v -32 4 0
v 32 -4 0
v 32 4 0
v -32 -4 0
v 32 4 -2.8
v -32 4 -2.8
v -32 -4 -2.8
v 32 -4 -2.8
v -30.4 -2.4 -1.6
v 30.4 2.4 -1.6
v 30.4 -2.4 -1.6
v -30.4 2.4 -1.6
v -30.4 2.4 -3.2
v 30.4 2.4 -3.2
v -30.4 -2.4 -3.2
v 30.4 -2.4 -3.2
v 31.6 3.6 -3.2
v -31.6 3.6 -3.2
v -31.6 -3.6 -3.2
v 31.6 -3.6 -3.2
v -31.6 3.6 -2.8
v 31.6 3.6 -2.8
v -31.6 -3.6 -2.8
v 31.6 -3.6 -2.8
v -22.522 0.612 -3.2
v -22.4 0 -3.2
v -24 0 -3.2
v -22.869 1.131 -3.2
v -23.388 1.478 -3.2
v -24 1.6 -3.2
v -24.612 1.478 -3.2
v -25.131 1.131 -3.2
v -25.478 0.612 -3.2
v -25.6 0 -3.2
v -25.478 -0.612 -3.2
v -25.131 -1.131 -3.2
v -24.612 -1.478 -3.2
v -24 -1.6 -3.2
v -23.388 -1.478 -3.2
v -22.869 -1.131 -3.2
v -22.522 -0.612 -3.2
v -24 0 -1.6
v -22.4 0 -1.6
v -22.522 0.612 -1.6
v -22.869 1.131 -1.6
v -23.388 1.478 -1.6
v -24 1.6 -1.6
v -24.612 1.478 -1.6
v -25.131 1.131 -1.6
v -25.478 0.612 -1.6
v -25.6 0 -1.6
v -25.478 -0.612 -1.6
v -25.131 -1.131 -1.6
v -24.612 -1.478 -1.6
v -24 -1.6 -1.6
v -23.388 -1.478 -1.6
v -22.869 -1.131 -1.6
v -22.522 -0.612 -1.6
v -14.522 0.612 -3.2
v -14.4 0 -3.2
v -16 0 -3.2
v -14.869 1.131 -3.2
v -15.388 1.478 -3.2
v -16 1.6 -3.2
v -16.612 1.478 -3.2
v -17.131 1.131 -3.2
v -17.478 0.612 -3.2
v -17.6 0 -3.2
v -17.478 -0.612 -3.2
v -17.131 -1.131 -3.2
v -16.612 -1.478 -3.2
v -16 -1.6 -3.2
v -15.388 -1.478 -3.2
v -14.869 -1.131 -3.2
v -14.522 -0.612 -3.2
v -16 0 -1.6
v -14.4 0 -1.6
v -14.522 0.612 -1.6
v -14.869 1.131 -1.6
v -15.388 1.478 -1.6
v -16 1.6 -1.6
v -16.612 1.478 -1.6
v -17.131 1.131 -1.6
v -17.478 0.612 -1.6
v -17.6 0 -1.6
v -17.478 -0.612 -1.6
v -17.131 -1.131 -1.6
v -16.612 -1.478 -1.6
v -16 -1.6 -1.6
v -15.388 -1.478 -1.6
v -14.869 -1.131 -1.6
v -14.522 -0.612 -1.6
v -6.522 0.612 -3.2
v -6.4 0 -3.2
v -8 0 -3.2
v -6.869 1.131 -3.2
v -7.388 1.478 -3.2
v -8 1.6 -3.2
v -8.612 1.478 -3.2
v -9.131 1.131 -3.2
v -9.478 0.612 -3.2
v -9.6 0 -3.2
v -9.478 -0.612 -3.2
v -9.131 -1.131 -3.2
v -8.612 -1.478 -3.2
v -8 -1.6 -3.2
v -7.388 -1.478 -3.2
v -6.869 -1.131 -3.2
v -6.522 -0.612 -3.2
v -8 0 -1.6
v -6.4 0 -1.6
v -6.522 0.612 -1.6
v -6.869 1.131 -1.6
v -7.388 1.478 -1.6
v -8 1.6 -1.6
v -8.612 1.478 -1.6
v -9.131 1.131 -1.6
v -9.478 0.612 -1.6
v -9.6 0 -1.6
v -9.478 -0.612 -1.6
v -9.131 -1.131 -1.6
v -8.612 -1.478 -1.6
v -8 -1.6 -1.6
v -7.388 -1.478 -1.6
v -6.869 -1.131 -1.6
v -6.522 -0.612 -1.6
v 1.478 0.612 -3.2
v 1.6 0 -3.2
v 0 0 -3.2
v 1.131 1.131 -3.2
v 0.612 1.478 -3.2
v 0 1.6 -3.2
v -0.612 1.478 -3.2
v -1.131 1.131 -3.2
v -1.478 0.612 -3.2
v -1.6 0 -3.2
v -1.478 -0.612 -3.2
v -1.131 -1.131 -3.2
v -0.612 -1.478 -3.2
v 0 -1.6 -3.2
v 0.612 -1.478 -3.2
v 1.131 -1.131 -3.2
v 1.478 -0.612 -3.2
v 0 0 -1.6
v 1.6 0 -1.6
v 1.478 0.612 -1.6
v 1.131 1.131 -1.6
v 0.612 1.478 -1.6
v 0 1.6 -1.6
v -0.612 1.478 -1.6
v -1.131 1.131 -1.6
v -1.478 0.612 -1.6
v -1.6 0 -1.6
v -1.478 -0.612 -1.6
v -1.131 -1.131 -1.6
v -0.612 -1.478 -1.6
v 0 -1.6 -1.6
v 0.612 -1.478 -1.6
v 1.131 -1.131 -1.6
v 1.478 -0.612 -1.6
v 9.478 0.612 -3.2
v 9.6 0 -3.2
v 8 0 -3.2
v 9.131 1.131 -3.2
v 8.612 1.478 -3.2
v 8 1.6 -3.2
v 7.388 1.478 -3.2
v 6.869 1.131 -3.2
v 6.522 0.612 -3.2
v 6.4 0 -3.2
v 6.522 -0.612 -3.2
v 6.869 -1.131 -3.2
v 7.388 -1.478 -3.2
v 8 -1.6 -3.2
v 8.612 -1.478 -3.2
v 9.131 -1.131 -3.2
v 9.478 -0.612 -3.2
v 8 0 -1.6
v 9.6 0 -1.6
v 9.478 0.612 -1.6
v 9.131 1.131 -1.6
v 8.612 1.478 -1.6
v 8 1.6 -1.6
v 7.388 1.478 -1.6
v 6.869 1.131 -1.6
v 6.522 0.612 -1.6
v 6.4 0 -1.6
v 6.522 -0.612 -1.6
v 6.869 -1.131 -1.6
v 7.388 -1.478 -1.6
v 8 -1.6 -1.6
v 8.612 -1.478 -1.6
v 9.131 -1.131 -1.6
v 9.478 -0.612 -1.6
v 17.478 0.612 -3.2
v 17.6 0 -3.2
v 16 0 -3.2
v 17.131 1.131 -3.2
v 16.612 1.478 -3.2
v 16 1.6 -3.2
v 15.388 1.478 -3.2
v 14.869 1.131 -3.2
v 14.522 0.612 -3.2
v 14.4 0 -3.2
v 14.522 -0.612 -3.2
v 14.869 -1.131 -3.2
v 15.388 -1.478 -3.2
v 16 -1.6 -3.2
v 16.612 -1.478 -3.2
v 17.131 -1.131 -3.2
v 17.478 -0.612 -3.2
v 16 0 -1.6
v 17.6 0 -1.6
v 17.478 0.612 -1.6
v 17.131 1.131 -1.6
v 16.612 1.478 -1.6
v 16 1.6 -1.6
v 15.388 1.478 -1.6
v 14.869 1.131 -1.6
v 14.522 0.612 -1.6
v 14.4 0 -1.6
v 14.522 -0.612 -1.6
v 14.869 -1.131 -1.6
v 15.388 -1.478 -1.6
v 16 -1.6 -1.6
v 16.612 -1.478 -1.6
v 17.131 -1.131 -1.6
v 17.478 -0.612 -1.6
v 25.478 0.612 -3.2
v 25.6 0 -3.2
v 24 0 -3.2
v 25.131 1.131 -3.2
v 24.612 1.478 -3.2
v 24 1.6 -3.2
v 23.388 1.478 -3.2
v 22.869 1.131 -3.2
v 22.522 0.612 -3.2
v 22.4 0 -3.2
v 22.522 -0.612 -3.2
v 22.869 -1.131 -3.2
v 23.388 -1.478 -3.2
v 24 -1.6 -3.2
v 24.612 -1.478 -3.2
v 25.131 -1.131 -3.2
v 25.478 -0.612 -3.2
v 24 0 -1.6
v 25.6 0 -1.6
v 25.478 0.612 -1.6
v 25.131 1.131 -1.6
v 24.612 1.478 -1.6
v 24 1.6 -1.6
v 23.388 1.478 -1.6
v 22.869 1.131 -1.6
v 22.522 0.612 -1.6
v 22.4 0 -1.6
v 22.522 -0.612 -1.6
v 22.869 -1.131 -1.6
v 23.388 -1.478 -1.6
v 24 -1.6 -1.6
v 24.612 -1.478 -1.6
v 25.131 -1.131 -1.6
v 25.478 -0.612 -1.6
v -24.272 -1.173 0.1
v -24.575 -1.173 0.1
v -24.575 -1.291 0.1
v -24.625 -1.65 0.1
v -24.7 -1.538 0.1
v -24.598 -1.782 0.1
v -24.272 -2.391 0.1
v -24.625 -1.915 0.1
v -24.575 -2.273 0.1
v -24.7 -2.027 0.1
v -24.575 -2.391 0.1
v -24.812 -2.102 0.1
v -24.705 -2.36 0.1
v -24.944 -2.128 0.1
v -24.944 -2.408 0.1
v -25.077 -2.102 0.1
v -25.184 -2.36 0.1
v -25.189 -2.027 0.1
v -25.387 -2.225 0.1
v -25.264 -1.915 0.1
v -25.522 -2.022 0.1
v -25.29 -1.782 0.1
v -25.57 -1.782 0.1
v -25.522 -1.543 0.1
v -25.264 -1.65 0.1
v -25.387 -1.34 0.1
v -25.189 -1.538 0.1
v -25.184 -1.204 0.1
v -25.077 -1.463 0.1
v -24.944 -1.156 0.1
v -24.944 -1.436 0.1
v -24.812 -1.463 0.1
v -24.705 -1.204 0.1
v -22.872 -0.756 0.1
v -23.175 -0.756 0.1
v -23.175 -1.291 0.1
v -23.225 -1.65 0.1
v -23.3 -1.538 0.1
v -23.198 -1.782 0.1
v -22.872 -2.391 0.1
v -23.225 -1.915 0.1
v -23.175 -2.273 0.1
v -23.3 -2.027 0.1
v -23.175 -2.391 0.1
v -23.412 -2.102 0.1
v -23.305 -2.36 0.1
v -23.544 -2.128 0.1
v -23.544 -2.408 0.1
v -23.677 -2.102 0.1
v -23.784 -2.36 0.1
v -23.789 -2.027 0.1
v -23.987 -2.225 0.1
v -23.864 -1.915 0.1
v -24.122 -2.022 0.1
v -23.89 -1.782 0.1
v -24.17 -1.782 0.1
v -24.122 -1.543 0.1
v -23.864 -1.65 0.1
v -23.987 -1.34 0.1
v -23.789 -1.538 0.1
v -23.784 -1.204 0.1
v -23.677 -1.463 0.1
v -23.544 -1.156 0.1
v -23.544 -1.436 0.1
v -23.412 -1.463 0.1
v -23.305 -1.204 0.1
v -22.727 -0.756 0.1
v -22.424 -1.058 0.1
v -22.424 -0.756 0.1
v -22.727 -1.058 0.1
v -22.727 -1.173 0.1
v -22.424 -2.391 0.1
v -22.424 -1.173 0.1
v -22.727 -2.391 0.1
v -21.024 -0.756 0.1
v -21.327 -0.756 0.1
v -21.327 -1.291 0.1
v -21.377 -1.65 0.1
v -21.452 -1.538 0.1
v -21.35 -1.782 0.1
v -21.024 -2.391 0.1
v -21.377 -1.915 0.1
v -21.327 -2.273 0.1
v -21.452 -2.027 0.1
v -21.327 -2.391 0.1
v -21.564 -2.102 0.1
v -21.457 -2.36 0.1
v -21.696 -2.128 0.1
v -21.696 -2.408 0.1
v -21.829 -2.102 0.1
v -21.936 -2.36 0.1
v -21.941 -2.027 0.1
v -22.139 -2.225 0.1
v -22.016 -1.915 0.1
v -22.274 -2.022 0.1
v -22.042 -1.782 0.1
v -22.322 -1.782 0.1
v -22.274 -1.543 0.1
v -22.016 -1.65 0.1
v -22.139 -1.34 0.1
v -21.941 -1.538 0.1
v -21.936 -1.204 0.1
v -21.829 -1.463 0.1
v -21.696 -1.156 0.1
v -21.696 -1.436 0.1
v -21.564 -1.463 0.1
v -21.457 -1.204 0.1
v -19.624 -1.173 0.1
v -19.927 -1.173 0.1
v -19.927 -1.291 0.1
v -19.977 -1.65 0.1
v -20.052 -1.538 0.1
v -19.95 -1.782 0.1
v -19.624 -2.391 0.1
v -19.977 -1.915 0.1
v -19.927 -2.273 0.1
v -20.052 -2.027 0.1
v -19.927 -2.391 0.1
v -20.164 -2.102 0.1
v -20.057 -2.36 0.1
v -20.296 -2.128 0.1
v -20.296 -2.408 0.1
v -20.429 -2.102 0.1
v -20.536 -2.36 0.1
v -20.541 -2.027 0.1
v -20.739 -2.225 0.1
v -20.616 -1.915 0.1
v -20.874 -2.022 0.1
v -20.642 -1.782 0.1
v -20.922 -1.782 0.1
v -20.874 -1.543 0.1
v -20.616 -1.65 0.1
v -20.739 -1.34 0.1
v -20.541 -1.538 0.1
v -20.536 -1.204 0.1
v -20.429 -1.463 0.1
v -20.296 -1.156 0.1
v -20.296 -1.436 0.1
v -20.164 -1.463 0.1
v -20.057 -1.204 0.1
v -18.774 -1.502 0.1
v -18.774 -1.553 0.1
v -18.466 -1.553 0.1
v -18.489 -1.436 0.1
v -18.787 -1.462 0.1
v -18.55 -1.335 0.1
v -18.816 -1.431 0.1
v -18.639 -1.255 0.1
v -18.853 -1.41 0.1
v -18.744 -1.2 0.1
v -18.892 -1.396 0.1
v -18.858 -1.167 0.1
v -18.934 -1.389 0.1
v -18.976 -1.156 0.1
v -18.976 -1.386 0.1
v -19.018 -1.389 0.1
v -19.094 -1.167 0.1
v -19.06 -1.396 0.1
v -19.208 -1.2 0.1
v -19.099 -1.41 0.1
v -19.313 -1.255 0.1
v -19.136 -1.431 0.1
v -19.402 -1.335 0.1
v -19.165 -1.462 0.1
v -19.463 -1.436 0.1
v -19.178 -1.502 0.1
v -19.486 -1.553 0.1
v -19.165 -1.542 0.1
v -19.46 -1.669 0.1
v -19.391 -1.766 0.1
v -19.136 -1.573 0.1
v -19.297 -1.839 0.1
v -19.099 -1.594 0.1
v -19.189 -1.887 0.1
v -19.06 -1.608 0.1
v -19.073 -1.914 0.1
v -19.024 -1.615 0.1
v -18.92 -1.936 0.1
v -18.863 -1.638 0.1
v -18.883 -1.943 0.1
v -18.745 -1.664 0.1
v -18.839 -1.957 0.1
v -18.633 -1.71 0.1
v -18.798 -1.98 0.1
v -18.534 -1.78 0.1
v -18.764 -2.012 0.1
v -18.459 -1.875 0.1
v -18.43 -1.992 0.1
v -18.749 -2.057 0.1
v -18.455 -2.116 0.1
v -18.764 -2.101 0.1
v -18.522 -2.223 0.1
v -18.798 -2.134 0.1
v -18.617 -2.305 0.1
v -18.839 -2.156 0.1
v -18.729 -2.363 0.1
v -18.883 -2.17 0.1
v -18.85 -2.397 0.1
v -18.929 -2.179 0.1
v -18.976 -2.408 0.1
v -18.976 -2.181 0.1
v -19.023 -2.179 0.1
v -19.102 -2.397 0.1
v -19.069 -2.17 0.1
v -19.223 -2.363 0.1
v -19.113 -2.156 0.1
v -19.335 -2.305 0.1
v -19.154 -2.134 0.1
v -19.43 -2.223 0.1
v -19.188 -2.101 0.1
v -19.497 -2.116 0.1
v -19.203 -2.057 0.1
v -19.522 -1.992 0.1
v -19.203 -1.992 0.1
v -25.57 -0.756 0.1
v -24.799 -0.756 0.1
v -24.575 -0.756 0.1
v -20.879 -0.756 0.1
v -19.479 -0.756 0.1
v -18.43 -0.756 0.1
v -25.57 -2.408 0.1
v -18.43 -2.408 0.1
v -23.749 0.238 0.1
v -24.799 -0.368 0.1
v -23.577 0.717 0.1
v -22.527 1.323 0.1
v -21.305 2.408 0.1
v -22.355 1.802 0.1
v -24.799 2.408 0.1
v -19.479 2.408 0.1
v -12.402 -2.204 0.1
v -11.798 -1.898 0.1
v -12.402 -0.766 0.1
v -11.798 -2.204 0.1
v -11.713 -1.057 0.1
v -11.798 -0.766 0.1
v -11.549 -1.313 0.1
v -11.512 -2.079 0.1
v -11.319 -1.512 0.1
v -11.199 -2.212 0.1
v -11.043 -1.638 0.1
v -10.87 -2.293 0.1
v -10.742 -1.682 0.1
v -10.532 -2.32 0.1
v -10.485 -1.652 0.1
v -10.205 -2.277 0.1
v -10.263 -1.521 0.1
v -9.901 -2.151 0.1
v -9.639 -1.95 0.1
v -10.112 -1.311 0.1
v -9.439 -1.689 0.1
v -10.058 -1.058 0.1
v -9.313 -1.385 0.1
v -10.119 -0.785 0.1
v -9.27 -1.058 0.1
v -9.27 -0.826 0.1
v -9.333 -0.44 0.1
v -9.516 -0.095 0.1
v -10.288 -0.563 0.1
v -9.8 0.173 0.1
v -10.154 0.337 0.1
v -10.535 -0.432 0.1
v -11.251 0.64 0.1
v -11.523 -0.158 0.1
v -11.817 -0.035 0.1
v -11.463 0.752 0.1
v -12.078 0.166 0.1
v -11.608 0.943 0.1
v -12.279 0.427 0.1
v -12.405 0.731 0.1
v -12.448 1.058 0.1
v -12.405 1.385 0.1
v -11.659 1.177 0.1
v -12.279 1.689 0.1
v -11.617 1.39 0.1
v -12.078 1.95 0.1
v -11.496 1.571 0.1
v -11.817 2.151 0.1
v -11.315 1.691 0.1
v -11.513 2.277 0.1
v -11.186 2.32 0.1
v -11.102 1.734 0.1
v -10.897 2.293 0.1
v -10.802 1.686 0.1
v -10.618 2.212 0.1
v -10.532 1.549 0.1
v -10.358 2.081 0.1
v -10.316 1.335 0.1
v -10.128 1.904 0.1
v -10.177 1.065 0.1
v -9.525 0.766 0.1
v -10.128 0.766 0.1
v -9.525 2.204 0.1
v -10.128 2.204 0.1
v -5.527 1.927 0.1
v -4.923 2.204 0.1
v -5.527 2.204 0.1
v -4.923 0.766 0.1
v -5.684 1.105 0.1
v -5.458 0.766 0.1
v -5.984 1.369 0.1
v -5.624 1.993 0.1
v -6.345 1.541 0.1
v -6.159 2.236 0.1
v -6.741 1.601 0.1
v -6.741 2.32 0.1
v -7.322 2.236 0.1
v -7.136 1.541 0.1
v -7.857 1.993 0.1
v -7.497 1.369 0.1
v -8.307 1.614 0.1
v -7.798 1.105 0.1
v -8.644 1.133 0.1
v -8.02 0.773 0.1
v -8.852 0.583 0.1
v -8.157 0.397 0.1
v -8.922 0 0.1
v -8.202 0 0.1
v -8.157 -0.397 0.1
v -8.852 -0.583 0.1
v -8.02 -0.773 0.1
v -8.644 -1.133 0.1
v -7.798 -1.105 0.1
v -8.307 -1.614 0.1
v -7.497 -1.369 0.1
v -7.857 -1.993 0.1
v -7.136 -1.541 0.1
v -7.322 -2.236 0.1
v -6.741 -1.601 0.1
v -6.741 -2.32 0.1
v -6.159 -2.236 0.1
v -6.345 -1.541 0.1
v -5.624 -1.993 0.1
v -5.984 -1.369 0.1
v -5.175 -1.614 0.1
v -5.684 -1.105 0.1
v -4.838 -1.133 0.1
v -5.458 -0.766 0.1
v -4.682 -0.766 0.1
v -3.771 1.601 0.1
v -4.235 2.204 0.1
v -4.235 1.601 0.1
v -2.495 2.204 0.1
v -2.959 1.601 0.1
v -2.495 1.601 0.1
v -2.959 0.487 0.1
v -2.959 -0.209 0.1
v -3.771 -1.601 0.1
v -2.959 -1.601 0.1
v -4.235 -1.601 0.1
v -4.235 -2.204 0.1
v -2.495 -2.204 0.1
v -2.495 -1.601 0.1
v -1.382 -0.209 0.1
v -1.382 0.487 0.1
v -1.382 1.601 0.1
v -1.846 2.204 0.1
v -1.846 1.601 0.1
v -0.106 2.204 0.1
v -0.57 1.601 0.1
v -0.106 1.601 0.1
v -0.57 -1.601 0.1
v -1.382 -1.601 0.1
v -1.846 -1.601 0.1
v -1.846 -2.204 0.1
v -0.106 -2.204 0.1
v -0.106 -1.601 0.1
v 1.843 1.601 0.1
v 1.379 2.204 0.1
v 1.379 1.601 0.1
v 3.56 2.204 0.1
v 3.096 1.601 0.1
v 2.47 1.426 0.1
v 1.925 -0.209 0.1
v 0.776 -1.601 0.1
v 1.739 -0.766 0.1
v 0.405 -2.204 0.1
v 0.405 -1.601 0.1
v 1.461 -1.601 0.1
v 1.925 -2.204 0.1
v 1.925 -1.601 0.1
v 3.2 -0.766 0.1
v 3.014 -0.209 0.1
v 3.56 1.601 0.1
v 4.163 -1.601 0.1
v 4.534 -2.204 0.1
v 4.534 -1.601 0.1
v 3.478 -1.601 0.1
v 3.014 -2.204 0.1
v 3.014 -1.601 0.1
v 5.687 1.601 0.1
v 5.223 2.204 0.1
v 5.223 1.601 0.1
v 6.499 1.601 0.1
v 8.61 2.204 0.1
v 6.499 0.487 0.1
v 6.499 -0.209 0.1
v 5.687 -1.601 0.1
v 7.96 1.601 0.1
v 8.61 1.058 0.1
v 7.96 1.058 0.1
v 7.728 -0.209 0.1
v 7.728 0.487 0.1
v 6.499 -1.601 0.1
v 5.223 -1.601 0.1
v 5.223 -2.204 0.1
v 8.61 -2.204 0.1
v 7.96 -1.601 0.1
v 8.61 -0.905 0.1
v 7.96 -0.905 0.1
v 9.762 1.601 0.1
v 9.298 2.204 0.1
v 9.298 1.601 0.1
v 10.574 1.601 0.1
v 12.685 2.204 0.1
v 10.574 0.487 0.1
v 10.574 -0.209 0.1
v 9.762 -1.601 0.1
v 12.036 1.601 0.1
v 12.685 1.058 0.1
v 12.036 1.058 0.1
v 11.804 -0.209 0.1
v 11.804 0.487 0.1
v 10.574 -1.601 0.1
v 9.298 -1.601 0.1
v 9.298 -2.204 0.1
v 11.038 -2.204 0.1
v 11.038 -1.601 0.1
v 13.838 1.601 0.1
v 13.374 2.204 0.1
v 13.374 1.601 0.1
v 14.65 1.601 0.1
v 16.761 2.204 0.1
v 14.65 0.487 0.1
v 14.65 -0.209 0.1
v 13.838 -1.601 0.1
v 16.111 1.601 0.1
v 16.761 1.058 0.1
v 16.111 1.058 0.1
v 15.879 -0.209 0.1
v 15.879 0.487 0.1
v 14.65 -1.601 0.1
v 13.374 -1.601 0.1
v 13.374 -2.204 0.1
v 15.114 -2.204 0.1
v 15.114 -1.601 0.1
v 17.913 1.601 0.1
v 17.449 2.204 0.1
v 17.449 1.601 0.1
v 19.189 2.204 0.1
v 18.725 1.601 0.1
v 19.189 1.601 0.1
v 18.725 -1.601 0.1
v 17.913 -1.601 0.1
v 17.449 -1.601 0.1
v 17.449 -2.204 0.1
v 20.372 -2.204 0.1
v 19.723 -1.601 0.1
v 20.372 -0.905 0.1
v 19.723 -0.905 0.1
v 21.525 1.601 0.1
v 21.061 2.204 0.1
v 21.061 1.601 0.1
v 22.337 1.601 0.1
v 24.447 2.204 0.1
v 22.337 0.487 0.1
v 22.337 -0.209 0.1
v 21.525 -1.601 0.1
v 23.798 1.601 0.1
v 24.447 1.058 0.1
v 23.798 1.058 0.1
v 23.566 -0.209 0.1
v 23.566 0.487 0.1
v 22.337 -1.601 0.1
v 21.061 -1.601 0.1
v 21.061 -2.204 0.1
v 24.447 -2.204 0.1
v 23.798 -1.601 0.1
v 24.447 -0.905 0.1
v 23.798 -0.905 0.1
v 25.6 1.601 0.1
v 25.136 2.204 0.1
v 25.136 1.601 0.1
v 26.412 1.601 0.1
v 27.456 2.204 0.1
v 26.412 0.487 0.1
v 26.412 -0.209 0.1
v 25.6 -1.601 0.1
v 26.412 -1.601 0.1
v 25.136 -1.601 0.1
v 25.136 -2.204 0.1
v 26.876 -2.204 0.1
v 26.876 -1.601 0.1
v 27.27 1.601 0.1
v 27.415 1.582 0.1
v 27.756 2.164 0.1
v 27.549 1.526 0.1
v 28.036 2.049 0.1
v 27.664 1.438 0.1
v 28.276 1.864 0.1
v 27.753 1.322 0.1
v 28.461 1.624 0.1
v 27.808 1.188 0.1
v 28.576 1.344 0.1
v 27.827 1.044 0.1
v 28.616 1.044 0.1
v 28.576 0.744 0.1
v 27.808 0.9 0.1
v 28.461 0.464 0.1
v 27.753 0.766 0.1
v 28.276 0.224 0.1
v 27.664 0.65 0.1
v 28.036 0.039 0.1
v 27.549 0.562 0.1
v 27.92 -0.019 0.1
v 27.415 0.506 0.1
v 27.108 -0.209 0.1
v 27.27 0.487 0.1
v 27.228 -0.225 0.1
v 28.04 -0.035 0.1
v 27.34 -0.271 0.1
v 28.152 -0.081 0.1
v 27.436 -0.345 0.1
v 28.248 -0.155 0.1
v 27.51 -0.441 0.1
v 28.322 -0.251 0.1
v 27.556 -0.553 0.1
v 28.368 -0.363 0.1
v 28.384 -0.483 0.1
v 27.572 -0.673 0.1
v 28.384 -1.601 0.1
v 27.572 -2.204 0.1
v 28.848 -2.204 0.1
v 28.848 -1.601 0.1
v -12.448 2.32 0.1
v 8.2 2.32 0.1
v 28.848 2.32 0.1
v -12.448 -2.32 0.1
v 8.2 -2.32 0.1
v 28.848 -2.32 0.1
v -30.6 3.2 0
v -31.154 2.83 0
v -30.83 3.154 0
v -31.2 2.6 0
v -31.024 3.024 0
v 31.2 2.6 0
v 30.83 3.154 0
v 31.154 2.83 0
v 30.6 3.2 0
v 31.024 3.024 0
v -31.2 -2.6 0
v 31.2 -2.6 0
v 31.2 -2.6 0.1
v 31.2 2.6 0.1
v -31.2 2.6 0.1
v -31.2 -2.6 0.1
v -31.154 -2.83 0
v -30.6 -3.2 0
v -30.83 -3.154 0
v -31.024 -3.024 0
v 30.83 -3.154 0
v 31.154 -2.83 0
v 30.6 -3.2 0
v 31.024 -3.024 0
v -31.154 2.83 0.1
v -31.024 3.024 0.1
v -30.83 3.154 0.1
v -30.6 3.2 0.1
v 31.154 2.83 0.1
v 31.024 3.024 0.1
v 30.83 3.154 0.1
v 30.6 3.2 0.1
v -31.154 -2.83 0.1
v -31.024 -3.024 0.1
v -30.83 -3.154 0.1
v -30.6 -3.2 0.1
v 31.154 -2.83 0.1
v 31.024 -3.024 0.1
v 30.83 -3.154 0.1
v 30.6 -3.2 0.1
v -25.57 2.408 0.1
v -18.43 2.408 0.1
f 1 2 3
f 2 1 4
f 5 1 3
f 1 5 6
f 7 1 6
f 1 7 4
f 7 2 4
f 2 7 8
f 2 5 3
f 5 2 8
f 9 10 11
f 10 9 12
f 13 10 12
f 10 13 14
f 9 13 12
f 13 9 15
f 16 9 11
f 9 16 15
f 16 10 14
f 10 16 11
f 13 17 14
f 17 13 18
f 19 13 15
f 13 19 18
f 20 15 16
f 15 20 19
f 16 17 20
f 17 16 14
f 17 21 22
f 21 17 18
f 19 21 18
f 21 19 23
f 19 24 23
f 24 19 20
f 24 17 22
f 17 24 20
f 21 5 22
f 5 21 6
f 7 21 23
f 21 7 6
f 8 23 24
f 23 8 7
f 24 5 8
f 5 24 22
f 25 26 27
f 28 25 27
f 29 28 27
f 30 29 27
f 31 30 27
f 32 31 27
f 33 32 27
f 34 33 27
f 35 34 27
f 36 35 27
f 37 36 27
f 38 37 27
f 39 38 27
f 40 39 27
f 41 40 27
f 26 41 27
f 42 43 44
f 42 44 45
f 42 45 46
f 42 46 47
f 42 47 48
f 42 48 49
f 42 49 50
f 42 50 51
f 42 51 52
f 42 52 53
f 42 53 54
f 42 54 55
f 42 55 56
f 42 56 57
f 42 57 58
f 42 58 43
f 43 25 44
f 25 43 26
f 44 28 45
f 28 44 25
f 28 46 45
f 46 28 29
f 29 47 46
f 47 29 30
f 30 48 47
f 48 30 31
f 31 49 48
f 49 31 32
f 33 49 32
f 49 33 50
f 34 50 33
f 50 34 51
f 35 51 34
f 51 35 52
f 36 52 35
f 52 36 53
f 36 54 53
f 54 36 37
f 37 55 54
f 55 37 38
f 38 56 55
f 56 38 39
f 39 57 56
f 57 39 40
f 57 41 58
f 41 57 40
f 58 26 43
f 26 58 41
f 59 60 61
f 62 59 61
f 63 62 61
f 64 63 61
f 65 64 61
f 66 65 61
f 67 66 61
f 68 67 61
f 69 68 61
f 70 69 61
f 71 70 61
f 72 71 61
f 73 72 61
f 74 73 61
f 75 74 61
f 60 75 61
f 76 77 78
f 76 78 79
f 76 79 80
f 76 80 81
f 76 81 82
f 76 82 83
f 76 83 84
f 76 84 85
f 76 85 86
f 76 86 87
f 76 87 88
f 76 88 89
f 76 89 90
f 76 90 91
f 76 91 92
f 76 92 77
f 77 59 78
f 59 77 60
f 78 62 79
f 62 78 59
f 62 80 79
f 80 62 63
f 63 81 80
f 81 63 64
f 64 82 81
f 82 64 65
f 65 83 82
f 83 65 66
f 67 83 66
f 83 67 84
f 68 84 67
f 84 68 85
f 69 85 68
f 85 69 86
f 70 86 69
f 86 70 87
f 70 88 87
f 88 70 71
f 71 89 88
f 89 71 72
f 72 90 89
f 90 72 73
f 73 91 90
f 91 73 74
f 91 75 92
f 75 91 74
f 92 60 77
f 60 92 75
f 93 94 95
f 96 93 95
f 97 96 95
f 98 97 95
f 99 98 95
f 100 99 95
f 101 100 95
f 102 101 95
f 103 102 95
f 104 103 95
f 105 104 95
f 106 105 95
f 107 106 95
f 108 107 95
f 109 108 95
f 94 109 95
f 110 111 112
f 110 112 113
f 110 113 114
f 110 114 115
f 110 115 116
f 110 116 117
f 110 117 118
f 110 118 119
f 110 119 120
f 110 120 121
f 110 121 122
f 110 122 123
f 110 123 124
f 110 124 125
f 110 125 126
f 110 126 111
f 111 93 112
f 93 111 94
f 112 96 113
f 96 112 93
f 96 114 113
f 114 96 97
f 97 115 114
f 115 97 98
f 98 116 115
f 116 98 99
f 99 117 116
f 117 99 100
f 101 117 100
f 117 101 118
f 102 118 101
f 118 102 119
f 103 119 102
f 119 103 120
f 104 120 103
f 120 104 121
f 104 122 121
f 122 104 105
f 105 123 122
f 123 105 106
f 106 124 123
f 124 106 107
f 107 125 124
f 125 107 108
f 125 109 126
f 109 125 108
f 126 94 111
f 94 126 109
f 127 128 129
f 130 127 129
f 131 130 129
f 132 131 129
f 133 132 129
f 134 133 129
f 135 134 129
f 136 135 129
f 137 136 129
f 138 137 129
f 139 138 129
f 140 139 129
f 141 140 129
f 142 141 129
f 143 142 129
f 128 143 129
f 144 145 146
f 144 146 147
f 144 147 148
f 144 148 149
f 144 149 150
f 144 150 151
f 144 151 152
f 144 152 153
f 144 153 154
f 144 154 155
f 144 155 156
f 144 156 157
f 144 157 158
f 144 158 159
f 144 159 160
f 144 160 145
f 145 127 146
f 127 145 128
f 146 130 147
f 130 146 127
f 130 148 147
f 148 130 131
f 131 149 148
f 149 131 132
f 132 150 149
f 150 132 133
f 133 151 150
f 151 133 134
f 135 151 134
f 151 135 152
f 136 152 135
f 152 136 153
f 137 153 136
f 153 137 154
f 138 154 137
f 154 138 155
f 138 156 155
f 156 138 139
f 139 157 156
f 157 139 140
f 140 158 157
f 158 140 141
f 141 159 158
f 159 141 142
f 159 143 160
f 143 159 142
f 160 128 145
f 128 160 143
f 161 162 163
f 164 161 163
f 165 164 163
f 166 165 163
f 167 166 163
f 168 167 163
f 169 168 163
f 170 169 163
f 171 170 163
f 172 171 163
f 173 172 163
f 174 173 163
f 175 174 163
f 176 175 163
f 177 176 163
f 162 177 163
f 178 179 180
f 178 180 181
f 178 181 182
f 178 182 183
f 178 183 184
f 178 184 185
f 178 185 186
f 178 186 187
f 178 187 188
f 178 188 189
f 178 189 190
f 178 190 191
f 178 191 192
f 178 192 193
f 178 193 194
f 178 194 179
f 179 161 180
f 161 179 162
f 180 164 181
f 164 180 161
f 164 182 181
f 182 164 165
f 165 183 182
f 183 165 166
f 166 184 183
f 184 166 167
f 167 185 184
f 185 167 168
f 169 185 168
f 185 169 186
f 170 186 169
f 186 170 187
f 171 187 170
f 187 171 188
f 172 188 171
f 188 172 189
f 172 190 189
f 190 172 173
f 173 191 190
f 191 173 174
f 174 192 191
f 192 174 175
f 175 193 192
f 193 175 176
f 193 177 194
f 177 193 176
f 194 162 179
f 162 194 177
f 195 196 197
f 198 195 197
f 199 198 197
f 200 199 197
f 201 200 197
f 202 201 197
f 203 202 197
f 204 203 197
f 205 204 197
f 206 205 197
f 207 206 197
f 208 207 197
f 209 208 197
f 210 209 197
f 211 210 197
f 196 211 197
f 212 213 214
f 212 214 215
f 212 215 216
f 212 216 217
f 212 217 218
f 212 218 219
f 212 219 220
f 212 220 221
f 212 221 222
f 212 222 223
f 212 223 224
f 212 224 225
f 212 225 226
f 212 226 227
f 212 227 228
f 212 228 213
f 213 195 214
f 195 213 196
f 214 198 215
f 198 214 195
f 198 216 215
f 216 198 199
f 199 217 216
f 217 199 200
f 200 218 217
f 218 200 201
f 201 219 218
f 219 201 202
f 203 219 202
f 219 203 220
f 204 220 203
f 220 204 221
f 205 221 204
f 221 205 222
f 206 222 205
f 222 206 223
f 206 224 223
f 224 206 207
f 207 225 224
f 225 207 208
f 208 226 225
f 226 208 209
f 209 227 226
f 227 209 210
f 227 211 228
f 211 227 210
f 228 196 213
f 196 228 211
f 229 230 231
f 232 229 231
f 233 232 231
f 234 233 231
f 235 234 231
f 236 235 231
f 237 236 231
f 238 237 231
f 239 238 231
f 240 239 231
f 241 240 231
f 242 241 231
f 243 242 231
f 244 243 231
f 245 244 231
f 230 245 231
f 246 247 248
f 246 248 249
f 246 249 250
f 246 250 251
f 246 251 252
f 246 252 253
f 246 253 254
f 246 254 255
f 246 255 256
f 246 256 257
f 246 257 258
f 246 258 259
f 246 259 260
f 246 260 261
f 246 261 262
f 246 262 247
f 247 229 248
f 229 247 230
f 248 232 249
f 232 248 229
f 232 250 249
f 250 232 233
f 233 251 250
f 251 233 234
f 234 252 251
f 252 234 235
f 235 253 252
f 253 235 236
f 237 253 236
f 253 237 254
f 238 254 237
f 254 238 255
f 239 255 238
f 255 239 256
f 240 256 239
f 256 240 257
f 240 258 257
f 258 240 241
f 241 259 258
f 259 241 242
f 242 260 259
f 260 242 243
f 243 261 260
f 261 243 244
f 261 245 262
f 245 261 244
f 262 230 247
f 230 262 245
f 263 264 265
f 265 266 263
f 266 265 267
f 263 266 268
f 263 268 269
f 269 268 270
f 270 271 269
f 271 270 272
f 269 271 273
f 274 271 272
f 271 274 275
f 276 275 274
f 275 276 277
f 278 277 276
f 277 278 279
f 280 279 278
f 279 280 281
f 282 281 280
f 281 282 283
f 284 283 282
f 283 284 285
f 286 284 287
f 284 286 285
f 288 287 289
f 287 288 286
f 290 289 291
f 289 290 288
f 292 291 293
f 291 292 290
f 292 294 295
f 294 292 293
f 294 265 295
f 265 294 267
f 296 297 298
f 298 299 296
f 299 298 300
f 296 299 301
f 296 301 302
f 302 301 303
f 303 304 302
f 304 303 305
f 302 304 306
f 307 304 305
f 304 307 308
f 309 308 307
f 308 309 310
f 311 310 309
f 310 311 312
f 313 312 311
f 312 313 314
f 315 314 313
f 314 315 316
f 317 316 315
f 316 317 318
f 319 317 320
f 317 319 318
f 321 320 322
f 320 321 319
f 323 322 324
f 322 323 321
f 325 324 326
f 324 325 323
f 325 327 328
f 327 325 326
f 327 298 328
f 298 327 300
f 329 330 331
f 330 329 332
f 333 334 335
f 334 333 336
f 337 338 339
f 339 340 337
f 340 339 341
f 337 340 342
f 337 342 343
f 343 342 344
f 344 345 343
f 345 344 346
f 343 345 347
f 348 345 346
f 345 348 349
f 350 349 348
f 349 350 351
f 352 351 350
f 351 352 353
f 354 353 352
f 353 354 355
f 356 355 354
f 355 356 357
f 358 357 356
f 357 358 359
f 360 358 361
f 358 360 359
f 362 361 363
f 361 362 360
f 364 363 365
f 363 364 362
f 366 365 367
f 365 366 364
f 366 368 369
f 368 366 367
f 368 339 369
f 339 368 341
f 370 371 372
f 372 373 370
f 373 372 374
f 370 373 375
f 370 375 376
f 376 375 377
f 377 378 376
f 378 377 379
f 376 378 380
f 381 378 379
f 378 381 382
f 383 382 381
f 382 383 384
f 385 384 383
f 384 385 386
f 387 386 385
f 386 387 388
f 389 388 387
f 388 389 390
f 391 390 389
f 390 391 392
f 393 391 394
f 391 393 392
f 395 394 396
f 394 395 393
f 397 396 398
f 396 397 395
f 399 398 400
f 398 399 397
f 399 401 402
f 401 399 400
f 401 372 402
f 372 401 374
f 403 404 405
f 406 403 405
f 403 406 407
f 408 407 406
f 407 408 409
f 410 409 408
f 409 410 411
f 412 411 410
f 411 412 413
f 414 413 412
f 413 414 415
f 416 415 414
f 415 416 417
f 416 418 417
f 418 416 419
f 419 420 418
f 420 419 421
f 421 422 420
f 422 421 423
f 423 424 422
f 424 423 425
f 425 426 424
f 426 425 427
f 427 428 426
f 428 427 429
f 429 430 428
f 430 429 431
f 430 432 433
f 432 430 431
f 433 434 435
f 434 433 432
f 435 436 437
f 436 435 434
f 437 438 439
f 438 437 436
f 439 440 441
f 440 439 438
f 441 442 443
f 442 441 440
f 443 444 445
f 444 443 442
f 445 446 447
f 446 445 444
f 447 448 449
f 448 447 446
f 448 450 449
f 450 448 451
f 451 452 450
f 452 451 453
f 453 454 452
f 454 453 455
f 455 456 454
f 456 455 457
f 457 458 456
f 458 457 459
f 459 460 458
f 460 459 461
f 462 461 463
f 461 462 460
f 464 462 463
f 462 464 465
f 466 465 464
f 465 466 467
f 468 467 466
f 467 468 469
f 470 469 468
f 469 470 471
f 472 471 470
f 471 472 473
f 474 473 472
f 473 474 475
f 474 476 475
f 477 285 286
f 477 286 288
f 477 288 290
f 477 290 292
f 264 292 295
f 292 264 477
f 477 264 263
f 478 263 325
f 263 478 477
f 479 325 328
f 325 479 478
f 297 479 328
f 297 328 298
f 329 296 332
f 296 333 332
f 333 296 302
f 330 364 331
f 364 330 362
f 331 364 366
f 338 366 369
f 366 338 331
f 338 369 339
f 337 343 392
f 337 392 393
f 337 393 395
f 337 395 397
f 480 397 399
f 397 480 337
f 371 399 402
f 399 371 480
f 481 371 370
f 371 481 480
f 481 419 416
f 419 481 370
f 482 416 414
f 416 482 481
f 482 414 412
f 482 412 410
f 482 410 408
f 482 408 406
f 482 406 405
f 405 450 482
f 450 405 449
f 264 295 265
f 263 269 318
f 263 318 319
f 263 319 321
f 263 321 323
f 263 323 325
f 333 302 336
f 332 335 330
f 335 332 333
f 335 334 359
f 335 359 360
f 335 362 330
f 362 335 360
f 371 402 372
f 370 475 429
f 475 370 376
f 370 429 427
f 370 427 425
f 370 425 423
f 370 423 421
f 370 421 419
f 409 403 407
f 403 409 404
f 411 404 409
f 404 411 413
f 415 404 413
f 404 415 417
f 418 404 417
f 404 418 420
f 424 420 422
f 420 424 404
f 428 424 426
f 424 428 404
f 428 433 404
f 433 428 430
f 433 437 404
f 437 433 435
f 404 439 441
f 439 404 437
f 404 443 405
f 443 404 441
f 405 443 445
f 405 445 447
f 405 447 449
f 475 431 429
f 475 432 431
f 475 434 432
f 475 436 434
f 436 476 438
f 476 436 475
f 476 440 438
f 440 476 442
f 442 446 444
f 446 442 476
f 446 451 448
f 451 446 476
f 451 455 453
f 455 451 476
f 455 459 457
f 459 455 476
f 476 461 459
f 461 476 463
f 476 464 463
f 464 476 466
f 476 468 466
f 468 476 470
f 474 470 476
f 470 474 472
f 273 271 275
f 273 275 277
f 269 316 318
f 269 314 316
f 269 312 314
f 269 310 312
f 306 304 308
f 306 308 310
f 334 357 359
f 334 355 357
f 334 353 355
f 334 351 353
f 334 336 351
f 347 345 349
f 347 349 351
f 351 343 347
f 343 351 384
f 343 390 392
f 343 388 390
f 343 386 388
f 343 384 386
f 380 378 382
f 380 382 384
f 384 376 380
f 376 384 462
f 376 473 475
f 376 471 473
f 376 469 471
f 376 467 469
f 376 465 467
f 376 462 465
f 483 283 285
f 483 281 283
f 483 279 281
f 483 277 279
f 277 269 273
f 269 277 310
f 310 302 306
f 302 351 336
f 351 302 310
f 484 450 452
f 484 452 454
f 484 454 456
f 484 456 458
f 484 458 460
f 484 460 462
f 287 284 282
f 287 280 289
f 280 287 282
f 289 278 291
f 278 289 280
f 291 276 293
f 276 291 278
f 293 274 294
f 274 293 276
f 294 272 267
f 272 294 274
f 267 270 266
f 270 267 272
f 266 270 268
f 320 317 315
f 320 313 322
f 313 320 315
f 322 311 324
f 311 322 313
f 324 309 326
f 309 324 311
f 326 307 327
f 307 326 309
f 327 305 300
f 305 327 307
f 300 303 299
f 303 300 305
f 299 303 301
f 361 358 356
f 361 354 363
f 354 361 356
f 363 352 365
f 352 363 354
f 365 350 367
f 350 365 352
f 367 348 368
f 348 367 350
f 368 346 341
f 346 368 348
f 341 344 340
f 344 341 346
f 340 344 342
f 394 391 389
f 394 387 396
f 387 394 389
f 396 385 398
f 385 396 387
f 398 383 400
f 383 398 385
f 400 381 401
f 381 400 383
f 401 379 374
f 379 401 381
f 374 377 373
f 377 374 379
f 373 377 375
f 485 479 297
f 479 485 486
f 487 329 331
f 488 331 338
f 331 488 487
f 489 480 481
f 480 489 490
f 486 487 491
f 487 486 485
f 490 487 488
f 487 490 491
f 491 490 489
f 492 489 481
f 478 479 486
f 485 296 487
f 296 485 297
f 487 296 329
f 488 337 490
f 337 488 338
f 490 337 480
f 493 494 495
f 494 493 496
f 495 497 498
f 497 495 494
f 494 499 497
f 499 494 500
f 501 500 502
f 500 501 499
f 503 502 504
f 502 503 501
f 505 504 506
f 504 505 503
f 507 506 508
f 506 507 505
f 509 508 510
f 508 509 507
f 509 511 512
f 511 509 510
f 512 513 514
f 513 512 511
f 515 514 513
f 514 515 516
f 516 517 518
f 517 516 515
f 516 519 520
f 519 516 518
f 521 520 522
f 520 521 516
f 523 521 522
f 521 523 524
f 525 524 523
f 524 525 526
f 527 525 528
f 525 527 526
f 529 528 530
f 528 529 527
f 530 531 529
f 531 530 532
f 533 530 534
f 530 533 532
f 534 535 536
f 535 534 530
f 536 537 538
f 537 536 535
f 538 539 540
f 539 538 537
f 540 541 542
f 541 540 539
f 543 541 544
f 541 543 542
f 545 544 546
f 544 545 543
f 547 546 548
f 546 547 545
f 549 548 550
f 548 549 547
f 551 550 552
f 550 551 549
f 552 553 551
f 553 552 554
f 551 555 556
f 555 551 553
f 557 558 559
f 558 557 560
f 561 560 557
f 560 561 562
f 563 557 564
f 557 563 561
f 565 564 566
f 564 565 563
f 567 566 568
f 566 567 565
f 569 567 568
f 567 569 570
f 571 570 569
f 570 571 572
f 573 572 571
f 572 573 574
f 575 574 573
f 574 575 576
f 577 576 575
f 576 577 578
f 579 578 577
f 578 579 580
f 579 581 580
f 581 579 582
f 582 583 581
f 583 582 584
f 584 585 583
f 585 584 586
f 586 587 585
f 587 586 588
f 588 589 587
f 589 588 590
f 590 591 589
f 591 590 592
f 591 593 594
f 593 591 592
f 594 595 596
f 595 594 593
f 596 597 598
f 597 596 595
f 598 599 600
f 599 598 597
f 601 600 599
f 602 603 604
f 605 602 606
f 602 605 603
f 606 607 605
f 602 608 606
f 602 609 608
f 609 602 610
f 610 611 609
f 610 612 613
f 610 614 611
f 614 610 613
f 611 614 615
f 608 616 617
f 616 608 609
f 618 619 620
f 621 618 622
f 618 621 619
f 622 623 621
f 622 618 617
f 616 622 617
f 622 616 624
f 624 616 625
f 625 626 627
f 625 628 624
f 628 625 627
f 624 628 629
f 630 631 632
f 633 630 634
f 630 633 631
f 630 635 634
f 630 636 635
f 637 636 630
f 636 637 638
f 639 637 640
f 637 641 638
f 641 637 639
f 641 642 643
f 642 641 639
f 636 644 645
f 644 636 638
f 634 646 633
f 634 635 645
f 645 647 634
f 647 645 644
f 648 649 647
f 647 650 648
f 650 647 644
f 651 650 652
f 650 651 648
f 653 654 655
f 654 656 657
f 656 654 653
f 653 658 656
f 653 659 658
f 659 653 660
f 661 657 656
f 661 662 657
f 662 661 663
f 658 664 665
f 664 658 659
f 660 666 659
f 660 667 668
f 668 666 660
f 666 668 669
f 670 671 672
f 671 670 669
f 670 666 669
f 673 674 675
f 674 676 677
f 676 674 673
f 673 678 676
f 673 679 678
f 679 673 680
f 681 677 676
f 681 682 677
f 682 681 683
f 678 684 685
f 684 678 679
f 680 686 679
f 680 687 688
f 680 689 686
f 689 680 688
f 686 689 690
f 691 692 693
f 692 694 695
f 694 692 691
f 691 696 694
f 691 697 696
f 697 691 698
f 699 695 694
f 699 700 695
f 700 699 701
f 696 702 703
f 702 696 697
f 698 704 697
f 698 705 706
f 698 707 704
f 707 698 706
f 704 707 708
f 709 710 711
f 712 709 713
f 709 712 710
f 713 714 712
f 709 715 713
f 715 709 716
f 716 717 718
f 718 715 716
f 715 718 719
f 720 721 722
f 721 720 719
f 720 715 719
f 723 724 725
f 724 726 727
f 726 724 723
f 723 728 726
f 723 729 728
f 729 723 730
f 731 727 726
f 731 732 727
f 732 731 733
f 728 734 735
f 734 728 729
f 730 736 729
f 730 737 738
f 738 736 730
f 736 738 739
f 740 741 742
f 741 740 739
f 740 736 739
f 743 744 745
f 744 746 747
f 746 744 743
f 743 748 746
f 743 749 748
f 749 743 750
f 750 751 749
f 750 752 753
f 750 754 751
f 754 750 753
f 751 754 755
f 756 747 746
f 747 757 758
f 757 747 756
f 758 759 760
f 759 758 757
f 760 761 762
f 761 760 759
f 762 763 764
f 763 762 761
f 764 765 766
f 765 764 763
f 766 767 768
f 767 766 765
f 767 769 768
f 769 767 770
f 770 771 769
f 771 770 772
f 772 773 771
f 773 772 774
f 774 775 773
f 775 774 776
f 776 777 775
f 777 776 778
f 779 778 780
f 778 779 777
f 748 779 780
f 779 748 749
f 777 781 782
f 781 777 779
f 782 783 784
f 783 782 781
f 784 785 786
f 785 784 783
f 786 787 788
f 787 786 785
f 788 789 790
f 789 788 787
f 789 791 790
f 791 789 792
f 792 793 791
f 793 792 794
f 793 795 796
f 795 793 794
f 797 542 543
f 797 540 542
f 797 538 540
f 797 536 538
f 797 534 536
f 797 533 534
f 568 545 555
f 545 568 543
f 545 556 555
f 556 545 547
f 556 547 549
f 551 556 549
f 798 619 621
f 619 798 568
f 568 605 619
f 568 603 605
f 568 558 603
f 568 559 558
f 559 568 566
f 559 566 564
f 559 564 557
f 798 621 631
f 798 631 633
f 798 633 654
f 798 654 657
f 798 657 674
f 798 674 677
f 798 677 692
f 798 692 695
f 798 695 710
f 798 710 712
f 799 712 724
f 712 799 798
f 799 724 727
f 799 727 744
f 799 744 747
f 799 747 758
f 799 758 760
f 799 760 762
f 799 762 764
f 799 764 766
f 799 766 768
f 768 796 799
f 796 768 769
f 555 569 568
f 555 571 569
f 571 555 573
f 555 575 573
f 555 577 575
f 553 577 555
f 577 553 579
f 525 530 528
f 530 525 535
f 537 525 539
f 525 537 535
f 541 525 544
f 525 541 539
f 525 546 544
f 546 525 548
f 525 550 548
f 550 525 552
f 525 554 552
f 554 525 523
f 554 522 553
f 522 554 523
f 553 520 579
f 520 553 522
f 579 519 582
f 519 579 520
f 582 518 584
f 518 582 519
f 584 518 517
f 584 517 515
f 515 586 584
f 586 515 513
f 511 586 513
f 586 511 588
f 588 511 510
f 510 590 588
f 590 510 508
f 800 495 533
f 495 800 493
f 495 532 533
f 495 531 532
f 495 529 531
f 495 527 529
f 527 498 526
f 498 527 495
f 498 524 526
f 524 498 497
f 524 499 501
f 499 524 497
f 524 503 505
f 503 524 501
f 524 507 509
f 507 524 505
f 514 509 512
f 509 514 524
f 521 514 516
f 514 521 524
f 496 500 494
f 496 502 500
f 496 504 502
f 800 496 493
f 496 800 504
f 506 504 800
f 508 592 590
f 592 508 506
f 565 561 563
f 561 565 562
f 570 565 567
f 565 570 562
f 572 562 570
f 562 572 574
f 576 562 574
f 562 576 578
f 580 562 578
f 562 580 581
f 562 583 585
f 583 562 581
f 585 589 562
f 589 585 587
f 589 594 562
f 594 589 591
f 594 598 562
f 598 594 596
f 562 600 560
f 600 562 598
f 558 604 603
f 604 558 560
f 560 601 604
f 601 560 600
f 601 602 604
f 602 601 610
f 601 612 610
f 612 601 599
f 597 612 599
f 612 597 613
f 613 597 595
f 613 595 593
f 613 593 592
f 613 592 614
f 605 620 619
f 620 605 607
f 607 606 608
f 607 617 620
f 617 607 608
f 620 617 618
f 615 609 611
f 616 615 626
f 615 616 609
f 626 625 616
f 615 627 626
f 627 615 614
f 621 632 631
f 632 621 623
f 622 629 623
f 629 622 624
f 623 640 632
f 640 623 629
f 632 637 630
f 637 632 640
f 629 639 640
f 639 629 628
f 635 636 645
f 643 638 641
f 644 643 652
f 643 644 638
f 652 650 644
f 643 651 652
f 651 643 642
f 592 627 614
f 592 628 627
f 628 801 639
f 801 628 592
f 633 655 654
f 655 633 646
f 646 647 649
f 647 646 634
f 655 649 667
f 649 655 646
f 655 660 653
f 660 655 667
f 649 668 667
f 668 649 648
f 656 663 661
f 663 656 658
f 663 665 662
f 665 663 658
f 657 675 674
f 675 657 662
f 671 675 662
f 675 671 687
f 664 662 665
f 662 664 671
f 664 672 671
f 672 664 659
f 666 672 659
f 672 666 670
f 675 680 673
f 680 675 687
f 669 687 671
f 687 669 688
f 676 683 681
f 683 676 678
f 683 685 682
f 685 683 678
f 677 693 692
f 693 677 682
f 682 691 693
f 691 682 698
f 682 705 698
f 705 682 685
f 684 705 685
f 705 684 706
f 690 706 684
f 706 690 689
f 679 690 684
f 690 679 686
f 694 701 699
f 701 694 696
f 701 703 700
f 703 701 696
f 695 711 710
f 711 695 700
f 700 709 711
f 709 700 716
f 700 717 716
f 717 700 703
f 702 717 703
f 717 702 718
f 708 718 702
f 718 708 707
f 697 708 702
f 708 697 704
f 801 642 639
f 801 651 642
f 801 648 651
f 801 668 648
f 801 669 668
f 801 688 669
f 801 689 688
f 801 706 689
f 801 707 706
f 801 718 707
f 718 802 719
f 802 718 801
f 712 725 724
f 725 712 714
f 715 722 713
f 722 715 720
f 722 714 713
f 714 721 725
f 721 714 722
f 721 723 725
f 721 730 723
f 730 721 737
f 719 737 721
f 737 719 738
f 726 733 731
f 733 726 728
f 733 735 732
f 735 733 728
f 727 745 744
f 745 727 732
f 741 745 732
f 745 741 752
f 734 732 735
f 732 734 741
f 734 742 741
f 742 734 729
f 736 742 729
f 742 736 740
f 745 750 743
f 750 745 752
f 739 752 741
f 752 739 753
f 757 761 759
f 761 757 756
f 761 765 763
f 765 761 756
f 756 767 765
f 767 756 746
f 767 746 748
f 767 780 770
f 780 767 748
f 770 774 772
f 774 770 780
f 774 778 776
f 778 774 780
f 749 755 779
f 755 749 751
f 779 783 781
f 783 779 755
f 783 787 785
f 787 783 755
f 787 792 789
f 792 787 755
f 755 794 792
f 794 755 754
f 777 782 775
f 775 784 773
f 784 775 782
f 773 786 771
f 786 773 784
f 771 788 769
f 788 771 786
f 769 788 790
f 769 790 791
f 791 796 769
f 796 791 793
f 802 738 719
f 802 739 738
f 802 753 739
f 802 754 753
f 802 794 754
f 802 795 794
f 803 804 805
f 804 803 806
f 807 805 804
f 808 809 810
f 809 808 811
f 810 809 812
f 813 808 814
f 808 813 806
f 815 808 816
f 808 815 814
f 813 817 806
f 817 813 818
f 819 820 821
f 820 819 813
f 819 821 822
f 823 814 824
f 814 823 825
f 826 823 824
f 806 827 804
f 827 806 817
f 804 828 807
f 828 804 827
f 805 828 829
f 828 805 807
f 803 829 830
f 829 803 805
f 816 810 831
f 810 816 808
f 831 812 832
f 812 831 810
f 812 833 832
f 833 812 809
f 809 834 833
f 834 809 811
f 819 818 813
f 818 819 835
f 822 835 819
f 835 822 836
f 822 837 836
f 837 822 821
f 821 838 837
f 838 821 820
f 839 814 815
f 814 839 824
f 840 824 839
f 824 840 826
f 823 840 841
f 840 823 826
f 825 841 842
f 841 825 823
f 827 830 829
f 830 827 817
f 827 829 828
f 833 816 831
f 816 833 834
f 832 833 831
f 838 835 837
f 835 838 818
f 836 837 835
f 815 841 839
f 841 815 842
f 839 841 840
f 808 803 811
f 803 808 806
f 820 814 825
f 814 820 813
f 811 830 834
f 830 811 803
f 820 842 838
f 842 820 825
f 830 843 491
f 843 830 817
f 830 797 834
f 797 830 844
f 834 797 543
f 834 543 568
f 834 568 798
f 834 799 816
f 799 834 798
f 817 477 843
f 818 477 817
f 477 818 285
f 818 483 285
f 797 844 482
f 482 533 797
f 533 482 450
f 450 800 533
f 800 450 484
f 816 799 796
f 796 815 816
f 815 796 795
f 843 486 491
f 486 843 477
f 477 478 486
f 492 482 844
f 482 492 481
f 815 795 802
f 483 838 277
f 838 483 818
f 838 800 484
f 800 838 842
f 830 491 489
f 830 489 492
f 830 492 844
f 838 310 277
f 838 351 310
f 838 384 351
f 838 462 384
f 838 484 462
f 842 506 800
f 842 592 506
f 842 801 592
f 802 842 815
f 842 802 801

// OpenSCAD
use <../lib.scad>
use <4162.scad>
use <6148328m.scad>
function ldraw_lib__4162d0h() = [
// 0 Tile  1 x  8 with White Adidas and Schaeffler Logos on Dark Grey Background Sticker
// 0 Name: 4162d0h.dat
// 0 Author: Vincent Messenet [Cheenzo]
// 0 !LDRAW_ORG Shortcut UPDATE 2026-05
// 0 !LICENSE Licensed under CC BY 4.0 : see CAreadme.txt
// 
// 0 BFC CERTIFY CCW
  [0,"BFC","CERTIFY"],
  [0,"BFC","CCW"],
// 
// 0 !CATEGORY Sticker Shortcut
// 
// 0 !KEYWORDS Bricklink 4162pb199, Porsche 919 Hybrid and 917K Pit Lane, set 75876
// 0 !KEYWORDS Speed Champions
// 
// 0 !HISTORY 2026-05-31 [OrionP] Official Update 2026-05
// 
// 1 16 0 0 0 1 0 0 0 1 0 0 0 1 4162.dat
  [1,16,0,0,0,1,0,0,0,1,0,0,0,1, ldraw_lib__4162()],
// 1 16 0 0 0 1 0 0 0 1 0 0 0 1 6148328m.dat
  [1,16,0,0,0,1,0,0,0,1,0,0,0,1, ldraw_lib__6148328m()],
];
module ldraw_lib__4162d0h(step=0, col=false, unit=2/5, alt=false, line=0.2, solid=!$preview)
    makepoly(ldraw_lib__4162d0h(), step=step, col=col, unit=unit, alt=alt, line=line, solid=solid);
ldraw_lib__4162d0h(line=0.2);
